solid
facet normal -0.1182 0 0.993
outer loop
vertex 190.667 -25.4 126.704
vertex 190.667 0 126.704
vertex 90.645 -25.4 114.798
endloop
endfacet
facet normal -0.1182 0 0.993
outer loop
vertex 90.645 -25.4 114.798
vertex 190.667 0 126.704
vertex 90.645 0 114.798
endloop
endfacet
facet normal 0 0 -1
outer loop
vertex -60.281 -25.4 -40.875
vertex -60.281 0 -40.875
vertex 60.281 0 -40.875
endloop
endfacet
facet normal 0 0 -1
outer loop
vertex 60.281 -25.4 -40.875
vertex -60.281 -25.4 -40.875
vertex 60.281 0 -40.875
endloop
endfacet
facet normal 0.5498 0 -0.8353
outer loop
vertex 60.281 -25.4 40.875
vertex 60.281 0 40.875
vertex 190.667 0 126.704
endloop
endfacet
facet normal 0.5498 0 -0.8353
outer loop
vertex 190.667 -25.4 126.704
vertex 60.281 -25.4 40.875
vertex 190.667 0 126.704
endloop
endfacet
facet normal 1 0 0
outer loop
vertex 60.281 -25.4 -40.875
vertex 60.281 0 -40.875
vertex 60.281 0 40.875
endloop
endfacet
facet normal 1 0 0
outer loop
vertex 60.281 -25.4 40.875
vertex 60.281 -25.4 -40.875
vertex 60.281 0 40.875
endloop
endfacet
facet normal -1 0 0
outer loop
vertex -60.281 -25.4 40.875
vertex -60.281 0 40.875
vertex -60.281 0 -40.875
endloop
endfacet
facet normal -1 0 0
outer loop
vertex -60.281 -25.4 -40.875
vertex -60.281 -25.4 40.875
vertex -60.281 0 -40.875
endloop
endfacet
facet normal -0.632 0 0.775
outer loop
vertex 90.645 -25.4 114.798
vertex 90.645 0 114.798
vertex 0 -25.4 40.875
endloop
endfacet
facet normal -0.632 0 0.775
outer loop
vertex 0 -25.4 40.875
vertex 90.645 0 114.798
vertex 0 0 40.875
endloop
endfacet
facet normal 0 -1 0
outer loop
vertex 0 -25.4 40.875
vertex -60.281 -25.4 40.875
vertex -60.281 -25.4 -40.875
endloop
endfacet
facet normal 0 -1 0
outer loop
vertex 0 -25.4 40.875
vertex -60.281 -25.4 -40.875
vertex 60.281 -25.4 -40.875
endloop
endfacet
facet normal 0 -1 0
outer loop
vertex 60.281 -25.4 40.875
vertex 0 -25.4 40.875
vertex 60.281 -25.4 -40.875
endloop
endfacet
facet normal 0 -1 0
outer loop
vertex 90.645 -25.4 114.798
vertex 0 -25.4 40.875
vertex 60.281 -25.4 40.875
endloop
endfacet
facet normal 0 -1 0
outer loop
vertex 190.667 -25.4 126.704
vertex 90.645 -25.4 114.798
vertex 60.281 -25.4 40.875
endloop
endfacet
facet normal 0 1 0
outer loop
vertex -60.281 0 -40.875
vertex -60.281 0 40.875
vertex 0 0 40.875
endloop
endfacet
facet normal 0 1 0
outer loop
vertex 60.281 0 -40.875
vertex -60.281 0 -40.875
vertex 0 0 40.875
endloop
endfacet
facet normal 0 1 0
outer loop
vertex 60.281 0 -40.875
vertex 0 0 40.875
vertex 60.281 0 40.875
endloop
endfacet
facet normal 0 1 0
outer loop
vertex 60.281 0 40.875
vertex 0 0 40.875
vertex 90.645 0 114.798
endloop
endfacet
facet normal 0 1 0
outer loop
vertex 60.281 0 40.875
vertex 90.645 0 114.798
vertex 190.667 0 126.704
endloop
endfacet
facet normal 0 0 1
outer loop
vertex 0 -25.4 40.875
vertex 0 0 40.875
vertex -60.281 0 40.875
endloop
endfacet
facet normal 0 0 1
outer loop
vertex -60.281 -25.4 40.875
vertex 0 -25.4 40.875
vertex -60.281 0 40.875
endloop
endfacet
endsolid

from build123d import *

# Parameters (mm, degrees)
F1_DEPTH = 25.4


with BuildPart() as f1:
    # F0 (on Front) → F1 (new body)
    with BuildSketch(Plane.XZ):
        Polygon((0, 40.874757), (60.281143, 40.874757), (190.667018, 126.703754), (90.644978, 114.797905), align=None)
        Polygon((-60.281143, -40.874757), (60.281143, -40.874757), (60.281143, 40.874757), (0, 40.874757), (-60.281143, 40.874757), align=None)
    extrude(amount=F1_DEPTH)


solid = f1.part
